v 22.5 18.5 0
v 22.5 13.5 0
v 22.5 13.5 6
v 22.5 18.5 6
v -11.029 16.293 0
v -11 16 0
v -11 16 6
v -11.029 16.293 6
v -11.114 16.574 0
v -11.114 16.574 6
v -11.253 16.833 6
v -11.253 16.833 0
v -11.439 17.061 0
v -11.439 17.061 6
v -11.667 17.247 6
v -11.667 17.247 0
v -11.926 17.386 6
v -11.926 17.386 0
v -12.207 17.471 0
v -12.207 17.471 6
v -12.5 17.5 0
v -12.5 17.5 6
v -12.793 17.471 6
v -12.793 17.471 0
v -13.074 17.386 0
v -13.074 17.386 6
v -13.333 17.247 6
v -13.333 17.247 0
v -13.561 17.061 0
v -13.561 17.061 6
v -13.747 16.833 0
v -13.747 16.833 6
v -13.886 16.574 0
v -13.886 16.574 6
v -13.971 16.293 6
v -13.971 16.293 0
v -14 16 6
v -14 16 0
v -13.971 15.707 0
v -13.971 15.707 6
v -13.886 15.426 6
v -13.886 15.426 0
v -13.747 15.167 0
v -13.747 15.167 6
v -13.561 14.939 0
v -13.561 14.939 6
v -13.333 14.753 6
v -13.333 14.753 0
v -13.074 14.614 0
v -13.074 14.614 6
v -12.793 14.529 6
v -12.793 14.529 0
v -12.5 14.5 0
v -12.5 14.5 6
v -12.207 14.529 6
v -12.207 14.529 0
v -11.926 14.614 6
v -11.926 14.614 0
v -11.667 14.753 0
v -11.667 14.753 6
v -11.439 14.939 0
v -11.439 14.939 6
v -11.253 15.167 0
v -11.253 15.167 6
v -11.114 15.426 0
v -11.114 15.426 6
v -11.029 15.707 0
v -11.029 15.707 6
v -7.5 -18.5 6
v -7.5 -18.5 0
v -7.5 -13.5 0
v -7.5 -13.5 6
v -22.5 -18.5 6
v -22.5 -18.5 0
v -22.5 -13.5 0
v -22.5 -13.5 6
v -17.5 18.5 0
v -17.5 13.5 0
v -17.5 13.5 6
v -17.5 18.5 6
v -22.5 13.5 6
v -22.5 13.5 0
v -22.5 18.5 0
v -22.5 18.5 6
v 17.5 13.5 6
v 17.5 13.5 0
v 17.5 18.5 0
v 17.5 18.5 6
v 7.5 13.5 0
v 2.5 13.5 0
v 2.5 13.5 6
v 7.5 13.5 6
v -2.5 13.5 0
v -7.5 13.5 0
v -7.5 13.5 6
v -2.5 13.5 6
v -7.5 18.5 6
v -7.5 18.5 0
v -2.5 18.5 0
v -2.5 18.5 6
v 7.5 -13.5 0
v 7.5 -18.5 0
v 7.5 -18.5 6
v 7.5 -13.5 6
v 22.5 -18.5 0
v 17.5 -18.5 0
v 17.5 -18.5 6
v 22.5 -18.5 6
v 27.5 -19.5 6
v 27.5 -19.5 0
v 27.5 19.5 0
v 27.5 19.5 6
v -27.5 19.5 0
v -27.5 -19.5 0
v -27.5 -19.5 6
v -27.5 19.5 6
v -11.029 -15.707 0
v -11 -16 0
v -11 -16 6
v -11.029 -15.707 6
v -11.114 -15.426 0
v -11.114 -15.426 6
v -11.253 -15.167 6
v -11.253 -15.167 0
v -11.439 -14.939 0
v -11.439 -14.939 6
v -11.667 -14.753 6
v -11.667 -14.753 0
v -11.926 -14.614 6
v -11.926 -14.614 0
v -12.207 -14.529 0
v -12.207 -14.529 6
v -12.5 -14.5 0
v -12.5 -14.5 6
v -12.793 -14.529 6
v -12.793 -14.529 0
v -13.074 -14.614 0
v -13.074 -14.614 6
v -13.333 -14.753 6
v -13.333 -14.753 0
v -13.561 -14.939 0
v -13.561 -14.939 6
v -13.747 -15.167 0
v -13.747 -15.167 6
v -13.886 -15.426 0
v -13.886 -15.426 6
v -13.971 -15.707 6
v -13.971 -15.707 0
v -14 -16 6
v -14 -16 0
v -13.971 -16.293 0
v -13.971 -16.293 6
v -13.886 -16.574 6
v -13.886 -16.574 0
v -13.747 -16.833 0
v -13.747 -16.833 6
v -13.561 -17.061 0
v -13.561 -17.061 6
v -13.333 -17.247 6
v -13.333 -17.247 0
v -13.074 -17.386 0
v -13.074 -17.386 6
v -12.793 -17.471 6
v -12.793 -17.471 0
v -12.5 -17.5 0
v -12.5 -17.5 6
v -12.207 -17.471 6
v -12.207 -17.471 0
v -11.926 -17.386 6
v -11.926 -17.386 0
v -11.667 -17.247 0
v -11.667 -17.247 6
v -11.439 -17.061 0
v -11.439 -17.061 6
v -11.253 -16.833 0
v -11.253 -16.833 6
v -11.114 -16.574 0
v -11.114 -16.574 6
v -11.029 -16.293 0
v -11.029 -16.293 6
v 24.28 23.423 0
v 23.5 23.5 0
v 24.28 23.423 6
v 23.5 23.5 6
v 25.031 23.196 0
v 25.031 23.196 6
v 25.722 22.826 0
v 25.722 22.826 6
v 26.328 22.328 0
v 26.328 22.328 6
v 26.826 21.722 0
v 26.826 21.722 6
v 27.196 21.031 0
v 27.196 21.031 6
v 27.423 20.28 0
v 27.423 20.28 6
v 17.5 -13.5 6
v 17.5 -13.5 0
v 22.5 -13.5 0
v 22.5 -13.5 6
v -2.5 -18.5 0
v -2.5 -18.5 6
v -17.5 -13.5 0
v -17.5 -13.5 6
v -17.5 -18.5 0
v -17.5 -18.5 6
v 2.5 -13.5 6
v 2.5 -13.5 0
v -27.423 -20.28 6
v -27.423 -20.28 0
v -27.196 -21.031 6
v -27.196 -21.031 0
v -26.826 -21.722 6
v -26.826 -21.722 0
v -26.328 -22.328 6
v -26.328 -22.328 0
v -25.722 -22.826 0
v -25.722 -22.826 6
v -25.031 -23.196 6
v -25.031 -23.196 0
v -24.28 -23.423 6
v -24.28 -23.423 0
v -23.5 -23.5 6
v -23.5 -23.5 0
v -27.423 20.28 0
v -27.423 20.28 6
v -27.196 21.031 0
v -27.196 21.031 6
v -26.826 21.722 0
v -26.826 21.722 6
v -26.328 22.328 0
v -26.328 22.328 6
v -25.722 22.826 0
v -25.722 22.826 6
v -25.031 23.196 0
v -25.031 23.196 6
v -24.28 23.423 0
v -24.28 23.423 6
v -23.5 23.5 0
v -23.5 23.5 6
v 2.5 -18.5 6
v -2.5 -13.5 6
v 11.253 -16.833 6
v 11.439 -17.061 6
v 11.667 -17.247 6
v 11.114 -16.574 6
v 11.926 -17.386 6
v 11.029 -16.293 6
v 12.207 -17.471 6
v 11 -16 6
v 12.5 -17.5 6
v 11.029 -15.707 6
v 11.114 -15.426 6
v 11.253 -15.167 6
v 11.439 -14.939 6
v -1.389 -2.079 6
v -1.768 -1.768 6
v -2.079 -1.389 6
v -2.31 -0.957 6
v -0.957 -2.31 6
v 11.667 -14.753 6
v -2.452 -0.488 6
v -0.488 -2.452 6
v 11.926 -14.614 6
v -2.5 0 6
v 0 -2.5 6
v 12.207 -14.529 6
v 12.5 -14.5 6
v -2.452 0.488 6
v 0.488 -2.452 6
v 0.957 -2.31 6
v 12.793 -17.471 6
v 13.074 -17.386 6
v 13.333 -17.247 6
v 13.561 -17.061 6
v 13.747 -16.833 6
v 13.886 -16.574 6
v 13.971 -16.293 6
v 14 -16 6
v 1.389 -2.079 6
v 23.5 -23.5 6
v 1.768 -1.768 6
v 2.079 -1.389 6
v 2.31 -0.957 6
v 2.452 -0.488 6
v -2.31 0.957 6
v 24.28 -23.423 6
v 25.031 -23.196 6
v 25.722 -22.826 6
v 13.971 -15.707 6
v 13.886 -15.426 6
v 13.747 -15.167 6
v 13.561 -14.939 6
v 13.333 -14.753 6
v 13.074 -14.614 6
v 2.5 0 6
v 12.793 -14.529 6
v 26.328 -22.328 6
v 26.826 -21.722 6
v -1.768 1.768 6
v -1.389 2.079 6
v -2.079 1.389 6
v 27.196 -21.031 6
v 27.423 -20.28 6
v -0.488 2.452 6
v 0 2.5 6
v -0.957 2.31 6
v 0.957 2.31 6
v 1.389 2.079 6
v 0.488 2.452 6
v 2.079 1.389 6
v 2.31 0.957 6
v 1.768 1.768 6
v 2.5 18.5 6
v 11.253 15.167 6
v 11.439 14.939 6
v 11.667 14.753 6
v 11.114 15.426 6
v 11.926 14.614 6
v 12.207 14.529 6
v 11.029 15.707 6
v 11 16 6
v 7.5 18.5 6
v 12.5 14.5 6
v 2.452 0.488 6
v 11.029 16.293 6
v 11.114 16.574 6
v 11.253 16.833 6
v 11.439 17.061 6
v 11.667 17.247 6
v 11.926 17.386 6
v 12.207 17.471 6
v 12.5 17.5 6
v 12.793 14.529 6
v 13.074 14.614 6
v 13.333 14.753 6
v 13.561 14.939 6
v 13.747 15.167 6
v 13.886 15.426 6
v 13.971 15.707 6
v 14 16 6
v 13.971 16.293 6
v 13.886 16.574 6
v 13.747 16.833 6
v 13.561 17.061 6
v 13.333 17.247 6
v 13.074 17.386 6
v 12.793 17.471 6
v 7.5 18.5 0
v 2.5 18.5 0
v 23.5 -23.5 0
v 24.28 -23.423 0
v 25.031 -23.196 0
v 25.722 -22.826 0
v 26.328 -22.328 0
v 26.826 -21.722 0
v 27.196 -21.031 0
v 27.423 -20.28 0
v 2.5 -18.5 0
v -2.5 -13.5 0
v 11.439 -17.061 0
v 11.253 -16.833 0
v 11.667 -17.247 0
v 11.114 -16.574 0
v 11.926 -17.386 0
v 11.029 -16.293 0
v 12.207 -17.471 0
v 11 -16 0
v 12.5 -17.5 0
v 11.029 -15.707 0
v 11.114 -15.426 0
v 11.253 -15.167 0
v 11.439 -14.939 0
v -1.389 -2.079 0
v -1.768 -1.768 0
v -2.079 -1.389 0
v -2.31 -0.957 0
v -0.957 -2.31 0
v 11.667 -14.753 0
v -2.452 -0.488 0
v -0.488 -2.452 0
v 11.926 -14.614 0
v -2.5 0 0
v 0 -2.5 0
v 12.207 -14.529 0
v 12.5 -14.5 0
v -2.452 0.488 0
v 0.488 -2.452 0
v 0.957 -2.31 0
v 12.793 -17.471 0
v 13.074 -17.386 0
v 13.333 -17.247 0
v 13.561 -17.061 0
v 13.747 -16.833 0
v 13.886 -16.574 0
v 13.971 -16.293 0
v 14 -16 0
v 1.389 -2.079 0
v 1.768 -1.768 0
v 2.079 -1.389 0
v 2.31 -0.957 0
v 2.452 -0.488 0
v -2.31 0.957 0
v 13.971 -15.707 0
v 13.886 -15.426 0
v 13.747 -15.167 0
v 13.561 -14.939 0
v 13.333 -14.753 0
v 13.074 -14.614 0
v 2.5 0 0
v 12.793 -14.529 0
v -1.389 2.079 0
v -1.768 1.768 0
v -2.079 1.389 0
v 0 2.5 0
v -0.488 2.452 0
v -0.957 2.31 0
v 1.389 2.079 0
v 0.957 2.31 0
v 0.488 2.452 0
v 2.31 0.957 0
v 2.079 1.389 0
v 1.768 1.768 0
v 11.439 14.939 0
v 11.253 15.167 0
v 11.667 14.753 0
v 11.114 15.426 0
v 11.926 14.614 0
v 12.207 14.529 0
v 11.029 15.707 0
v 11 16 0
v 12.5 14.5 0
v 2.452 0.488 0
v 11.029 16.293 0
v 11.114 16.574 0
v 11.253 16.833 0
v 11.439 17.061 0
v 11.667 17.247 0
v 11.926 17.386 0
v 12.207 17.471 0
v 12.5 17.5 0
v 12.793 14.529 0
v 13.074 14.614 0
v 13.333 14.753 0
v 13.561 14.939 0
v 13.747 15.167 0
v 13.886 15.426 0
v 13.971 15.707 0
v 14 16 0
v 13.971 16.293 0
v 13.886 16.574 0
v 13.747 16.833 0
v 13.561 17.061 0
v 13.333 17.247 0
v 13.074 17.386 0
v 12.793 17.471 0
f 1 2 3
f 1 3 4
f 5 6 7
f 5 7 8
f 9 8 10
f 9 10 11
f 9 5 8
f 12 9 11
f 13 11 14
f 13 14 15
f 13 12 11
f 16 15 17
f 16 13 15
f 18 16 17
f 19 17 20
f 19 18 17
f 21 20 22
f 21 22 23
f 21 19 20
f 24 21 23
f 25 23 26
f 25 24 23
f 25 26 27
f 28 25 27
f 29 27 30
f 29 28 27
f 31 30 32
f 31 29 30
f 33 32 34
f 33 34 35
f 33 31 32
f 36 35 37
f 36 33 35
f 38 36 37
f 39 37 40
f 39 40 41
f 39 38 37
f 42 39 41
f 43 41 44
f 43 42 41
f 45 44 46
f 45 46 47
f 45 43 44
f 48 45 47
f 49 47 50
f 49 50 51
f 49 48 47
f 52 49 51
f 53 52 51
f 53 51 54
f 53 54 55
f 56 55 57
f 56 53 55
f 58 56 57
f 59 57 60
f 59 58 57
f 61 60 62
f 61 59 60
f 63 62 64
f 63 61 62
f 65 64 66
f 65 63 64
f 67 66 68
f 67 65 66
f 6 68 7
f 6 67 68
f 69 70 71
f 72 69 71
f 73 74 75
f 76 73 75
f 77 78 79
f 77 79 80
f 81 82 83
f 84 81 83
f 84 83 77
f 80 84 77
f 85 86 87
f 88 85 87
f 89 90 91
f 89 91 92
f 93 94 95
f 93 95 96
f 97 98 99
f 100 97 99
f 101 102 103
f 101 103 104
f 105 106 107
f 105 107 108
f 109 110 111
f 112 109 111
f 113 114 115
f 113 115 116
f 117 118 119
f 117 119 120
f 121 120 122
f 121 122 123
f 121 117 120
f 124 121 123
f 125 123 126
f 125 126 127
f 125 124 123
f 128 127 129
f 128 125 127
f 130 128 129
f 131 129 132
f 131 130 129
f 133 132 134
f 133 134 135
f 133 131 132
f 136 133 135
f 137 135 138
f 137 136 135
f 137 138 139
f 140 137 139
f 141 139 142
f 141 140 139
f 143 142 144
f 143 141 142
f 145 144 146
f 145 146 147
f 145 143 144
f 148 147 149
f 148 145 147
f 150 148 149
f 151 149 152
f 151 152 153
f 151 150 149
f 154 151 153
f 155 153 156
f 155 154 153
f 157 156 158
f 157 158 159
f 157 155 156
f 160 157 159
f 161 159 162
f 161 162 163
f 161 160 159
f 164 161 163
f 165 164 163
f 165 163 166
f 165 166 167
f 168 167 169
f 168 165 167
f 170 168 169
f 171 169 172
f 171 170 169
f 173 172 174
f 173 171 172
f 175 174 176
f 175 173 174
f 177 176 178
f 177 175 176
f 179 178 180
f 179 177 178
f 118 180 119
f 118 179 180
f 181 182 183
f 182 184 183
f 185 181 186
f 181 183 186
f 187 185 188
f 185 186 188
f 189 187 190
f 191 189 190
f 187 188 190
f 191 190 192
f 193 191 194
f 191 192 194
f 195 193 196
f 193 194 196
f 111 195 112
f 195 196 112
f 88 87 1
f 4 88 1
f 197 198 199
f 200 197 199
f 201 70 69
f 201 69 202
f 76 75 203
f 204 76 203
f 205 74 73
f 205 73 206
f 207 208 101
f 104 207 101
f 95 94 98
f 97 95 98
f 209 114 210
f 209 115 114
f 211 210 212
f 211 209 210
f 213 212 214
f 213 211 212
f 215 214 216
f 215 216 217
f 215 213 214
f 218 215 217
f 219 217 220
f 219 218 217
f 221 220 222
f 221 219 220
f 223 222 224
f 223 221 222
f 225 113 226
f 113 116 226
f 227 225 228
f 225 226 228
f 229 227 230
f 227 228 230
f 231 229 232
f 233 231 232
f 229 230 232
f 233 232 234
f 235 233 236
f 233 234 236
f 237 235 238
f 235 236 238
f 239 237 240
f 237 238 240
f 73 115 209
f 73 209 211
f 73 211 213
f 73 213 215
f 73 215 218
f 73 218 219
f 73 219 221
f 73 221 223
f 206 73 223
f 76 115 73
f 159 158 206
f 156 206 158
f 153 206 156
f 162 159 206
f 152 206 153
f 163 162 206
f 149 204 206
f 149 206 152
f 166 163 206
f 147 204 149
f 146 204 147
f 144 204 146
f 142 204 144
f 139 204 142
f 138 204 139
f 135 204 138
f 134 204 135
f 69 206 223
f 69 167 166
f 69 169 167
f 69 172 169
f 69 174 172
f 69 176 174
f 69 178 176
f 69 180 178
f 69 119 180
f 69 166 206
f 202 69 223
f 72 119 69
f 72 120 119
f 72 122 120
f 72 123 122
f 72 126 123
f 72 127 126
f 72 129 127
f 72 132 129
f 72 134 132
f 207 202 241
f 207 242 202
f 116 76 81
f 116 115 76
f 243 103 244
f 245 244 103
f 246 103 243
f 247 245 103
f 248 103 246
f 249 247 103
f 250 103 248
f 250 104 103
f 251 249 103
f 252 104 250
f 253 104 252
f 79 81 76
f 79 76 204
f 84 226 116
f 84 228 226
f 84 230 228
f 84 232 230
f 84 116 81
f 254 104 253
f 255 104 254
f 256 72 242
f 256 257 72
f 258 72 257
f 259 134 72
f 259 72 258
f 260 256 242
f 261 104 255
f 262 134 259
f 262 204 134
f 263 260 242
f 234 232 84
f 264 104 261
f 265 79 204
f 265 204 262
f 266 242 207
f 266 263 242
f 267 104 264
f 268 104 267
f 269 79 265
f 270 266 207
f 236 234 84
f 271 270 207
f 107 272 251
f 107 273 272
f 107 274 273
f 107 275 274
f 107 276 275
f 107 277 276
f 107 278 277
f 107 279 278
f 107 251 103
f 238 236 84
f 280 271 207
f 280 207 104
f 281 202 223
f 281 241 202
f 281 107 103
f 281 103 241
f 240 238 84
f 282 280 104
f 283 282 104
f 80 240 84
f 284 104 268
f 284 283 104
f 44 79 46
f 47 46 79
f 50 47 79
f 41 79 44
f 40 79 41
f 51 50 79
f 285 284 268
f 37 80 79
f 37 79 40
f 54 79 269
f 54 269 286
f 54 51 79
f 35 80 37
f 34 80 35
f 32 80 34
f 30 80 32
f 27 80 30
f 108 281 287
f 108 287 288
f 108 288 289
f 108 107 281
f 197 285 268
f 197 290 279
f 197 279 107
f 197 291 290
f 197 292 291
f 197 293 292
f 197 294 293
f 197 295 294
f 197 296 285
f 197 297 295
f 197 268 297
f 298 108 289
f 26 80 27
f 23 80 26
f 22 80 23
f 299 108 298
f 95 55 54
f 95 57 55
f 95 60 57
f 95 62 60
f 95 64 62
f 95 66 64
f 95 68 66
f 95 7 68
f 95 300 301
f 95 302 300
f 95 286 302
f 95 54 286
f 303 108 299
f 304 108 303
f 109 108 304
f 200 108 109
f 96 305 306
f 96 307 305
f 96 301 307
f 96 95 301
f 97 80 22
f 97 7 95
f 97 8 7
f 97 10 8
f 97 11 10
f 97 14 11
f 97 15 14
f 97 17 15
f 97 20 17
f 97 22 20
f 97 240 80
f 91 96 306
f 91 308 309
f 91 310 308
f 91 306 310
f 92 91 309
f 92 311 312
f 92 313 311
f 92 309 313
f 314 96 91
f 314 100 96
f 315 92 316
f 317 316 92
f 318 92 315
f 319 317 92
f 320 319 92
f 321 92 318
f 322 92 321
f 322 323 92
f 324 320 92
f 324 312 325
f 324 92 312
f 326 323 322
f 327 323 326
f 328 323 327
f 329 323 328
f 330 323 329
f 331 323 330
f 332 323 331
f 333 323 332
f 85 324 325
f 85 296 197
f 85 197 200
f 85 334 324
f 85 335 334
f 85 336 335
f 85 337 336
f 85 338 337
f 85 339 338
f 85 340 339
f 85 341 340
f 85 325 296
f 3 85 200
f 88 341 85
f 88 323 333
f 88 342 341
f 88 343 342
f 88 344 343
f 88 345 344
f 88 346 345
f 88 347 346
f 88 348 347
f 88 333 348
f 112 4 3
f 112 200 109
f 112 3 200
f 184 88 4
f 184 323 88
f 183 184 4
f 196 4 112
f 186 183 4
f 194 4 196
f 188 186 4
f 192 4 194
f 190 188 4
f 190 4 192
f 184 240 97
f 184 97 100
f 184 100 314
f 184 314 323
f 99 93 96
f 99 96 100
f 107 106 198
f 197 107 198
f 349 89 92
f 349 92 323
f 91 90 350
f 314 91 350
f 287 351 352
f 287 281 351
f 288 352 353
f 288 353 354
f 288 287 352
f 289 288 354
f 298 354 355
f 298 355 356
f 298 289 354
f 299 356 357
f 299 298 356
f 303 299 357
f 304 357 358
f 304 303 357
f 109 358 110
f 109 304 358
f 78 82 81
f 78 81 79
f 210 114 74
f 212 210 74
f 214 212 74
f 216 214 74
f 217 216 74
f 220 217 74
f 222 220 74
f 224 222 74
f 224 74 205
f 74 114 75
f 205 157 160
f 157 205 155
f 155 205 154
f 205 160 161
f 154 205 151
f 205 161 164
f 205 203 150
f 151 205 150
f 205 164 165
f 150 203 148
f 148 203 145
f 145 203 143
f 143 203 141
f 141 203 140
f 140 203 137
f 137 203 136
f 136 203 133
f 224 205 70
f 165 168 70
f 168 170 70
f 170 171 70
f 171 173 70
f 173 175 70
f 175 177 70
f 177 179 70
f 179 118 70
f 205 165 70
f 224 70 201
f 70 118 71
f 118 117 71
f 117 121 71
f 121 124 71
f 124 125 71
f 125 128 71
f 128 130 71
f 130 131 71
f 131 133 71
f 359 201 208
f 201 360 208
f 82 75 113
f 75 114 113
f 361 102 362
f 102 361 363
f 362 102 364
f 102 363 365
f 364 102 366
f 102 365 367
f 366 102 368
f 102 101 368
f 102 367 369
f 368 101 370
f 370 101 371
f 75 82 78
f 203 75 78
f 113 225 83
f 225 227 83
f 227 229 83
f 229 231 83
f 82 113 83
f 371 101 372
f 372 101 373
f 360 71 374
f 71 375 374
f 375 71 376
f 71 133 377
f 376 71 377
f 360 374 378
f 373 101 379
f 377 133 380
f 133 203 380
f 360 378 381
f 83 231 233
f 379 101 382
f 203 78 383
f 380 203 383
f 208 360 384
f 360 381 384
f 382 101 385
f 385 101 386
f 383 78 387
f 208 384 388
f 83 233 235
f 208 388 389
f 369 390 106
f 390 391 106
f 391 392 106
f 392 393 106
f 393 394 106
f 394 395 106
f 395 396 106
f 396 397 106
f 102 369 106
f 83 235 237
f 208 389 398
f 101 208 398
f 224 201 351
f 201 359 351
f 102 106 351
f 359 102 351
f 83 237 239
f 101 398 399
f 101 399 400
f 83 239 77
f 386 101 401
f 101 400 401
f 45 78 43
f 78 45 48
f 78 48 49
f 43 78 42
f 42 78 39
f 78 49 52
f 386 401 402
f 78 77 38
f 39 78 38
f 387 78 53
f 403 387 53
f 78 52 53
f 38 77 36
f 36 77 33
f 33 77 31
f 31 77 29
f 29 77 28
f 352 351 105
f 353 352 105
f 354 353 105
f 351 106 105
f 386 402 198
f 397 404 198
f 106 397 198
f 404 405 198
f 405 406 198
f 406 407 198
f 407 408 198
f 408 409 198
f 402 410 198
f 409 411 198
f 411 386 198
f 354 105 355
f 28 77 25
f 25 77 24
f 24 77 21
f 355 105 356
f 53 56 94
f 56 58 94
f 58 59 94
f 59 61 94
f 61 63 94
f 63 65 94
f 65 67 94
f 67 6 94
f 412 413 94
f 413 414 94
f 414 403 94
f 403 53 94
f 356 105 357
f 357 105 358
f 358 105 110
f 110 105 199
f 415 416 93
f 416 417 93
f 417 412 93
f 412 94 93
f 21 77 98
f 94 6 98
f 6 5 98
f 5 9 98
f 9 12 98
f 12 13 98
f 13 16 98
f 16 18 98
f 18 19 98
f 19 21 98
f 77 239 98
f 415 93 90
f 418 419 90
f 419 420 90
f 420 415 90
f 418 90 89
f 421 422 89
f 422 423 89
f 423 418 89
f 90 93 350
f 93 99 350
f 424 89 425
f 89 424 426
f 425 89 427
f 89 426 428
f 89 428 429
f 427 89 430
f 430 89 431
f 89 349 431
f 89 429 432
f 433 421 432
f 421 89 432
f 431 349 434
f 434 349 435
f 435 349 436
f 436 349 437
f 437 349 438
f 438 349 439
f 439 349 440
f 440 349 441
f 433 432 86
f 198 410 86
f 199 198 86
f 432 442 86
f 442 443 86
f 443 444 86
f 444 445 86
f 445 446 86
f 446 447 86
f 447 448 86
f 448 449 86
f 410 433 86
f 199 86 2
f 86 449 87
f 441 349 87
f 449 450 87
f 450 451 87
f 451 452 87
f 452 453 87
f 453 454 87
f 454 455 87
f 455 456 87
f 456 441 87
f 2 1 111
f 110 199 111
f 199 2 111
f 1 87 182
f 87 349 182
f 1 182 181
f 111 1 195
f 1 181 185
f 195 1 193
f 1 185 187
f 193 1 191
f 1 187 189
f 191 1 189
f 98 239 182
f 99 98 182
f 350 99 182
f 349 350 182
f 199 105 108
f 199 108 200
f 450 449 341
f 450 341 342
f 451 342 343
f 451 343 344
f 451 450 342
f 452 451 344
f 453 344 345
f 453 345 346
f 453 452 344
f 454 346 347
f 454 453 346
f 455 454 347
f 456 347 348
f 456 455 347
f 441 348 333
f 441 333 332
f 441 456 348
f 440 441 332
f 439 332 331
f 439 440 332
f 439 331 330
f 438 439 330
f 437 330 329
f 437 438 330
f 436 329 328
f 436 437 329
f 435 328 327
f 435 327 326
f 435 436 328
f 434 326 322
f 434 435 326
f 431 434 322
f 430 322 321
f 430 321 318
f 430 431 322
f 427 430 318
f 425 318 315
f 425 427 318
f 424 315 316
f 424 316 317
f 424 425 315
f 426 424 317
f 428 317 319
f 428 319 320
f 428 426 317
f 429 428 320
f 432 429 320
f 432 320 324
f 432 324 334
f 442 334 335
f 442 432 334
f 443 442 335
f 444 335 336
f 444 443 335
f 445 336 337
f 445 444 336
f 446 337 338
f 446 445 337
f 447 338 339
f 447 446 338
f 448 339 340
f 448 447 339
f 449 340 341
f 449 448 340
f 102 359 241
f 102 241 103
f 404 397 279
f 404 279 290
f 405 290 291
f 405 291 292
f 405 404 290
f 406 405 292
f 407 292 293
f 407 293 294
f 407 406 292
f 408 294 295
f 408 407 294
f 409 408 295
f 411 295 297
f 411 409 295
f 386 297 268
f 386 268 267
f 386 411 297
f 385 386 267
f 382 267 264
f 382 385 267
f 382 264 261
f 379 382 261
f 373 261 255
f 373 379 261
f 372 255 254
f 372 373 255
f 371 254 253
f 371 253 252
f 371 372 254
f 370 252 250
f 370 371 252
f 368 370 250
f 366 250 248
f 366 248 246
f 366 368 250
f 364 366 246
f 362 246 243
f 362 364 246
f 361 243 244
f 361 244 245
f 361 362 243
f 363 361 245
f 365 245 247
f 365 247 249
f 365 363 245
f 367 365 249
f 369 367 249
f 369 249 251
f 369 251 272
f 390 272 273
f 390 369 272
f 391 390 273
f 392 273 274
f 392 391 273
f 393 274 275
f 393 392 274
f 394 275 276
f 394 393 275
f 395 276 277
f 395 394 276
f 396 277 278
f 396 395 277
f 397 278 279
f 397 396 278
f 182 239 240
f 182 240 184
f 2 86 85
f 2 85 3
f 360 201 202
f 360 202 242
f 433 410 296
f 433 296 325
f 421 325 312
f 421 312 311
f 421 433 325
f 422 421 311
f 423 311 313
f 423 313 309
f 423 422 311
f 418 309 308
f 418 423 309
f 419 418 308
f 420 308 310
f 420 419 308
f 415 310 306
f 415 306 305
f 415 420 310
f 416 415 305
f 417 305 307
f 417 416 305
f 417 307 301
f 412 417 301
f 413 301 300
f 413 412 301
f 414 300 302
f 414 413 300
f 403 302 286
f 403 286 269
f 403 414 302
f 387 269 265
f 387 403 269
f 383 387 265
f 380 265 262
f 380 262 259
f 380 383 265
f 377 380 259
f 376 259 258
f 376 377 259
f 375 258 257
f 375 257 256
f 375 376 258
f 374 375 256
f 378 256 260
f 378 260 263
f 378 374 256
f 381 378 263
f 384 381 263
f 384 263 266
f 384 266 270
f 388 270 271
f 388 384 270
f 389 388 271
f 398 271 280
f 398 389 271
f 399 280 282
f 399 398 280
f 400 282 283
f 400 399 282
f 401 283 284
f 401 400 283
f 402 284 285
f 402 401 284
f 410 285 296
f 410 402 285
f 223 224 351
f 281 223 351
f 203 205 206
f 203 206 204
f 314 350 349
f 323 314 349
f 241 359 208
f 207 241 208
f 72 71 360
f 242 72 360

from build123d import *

# Parameters (mm, degrees)
BOSS_EXTRU_1_OUTLINE_W   = 55
BOSS_EXTRU_1_OUTLINE_H   = 47
BOSS_EXTRU_1_OUTLINE_W_2 = 5
BOSS_EXTRU_1_OUTLINE_H_2 = 5
BOSS_EXTRU_1_OUTLINE_R   = 1.5
BOSS_EXTRU_1_OUTLINE_R_2 = 2.5
BOSS_EXTRU_1_DEPTH       = 6
CONG_1_R                 = 4


# Read off the part's stored shape, not the designer's step: Boss.-Extru.1
with BuildPart() as part:
    # Boss.-Extru.1 outline → Boss.-Extru.1 (new body)
    with BuildSketch(Plane.XY):
        Rectangle(BOSS_EXTRU_1_OUTLINE_W, BOSS_EXTRU_1_OUTLINE_H)
        with Locations((-20, -16)):
            Rectangle(BOSS_EXTRU_1_OUTLINE_W_2, BOSS_EXTRU_1_OUTLINE_H_2, mode=Mode.SUBTRACT)
        with Locations((-12.5, -16)):
            Circle(BOSS_EXTRU_1_OUTLINE_R, mode=Mode.SUBTRACT)
        with Locations((-5, -16)):
            Rectangle(BOSS_EXTRU_1_OUTLINE_W_2, BOSS_EXTRU_1_OUTLINE_H_2, mode=Mode.SUBTRACT)
        with Locations((5, -16)):
            Rectangle(BOSS_EXTRU_1_OUTLINE_W_2, BOSS_EXTRU_1_OUTLINE_H_2, mode=Mode.SUBTRACT)
        with Locations((12.5, -16)):
            Circle(BOSS_EXTRU_1_OUTLINE_R, mode=Mode.SUBTRACT)
        with Locations((20, -16)):
            Rectangle(BOSS_EXTRU_1_OUTLINE_W_2, BOSS_EXTRU_1_OUTLINE_H_2, mode=Mode.SUBTRACT)
        with Locations((-20, 16)):
            Rectangle(BOSS_EXTRU_1_OUTLINE_W_2, BOSS_EXTRU_1_OUTLINE_H_2, mode=Mode.SUBTRACT)
        with Locations((-12.5, 16)):
            Circle(BOSS_EXTRU_1_OUTLINE_R, mode=Mode.SUBTRACT)
        with Locations((-5, 16)):
            Rectangle(BOSS_EXTRU_1_OUTLINE_W_2, BOSS_EXTRU_1_OUTLINE_H_2, mode=Mode.SUBTRACT)
        Circle(BOSS_EXTRU_1_OUTLINE_R_2, mode=Mode.SUBTRACT)
        with Locations((5, 16)):
            Rectangle(BOSS_EXTRU_1_OUTLINE_W_2, BOSS_EXTRU_1_OUTLINE_H_2, mode=Mode.SUBTRACT)
        with Locations((12.5, 16)):
            Circle(BOSS_EXTRU_1_OUTLINE_R, mode=Mode.SUBTRACT)
        with Locations((20, 16)):
            Rectangle(BOSS_EXTRU_1_OUTLINE_W_2, BOSS_EXTRU_1_OUTLINE_H_2, mode=Mode.SUBTRACT)
    extrude(amount=BOSS_EXTRU_1_DEPTH)

    # Congé1
    cong_1_edges = [part.edges().sort_by_distance(p)[0] for p in [
        (-27.5, 23.5, 3),
        (27.5, 23.5, 3),
        (27.5, -23.5, 3),
        (-27.5, -23.5, 3),
    ]]
    fillet(cong_1_edges, radius=CONG_1_R)


solid = part.part
